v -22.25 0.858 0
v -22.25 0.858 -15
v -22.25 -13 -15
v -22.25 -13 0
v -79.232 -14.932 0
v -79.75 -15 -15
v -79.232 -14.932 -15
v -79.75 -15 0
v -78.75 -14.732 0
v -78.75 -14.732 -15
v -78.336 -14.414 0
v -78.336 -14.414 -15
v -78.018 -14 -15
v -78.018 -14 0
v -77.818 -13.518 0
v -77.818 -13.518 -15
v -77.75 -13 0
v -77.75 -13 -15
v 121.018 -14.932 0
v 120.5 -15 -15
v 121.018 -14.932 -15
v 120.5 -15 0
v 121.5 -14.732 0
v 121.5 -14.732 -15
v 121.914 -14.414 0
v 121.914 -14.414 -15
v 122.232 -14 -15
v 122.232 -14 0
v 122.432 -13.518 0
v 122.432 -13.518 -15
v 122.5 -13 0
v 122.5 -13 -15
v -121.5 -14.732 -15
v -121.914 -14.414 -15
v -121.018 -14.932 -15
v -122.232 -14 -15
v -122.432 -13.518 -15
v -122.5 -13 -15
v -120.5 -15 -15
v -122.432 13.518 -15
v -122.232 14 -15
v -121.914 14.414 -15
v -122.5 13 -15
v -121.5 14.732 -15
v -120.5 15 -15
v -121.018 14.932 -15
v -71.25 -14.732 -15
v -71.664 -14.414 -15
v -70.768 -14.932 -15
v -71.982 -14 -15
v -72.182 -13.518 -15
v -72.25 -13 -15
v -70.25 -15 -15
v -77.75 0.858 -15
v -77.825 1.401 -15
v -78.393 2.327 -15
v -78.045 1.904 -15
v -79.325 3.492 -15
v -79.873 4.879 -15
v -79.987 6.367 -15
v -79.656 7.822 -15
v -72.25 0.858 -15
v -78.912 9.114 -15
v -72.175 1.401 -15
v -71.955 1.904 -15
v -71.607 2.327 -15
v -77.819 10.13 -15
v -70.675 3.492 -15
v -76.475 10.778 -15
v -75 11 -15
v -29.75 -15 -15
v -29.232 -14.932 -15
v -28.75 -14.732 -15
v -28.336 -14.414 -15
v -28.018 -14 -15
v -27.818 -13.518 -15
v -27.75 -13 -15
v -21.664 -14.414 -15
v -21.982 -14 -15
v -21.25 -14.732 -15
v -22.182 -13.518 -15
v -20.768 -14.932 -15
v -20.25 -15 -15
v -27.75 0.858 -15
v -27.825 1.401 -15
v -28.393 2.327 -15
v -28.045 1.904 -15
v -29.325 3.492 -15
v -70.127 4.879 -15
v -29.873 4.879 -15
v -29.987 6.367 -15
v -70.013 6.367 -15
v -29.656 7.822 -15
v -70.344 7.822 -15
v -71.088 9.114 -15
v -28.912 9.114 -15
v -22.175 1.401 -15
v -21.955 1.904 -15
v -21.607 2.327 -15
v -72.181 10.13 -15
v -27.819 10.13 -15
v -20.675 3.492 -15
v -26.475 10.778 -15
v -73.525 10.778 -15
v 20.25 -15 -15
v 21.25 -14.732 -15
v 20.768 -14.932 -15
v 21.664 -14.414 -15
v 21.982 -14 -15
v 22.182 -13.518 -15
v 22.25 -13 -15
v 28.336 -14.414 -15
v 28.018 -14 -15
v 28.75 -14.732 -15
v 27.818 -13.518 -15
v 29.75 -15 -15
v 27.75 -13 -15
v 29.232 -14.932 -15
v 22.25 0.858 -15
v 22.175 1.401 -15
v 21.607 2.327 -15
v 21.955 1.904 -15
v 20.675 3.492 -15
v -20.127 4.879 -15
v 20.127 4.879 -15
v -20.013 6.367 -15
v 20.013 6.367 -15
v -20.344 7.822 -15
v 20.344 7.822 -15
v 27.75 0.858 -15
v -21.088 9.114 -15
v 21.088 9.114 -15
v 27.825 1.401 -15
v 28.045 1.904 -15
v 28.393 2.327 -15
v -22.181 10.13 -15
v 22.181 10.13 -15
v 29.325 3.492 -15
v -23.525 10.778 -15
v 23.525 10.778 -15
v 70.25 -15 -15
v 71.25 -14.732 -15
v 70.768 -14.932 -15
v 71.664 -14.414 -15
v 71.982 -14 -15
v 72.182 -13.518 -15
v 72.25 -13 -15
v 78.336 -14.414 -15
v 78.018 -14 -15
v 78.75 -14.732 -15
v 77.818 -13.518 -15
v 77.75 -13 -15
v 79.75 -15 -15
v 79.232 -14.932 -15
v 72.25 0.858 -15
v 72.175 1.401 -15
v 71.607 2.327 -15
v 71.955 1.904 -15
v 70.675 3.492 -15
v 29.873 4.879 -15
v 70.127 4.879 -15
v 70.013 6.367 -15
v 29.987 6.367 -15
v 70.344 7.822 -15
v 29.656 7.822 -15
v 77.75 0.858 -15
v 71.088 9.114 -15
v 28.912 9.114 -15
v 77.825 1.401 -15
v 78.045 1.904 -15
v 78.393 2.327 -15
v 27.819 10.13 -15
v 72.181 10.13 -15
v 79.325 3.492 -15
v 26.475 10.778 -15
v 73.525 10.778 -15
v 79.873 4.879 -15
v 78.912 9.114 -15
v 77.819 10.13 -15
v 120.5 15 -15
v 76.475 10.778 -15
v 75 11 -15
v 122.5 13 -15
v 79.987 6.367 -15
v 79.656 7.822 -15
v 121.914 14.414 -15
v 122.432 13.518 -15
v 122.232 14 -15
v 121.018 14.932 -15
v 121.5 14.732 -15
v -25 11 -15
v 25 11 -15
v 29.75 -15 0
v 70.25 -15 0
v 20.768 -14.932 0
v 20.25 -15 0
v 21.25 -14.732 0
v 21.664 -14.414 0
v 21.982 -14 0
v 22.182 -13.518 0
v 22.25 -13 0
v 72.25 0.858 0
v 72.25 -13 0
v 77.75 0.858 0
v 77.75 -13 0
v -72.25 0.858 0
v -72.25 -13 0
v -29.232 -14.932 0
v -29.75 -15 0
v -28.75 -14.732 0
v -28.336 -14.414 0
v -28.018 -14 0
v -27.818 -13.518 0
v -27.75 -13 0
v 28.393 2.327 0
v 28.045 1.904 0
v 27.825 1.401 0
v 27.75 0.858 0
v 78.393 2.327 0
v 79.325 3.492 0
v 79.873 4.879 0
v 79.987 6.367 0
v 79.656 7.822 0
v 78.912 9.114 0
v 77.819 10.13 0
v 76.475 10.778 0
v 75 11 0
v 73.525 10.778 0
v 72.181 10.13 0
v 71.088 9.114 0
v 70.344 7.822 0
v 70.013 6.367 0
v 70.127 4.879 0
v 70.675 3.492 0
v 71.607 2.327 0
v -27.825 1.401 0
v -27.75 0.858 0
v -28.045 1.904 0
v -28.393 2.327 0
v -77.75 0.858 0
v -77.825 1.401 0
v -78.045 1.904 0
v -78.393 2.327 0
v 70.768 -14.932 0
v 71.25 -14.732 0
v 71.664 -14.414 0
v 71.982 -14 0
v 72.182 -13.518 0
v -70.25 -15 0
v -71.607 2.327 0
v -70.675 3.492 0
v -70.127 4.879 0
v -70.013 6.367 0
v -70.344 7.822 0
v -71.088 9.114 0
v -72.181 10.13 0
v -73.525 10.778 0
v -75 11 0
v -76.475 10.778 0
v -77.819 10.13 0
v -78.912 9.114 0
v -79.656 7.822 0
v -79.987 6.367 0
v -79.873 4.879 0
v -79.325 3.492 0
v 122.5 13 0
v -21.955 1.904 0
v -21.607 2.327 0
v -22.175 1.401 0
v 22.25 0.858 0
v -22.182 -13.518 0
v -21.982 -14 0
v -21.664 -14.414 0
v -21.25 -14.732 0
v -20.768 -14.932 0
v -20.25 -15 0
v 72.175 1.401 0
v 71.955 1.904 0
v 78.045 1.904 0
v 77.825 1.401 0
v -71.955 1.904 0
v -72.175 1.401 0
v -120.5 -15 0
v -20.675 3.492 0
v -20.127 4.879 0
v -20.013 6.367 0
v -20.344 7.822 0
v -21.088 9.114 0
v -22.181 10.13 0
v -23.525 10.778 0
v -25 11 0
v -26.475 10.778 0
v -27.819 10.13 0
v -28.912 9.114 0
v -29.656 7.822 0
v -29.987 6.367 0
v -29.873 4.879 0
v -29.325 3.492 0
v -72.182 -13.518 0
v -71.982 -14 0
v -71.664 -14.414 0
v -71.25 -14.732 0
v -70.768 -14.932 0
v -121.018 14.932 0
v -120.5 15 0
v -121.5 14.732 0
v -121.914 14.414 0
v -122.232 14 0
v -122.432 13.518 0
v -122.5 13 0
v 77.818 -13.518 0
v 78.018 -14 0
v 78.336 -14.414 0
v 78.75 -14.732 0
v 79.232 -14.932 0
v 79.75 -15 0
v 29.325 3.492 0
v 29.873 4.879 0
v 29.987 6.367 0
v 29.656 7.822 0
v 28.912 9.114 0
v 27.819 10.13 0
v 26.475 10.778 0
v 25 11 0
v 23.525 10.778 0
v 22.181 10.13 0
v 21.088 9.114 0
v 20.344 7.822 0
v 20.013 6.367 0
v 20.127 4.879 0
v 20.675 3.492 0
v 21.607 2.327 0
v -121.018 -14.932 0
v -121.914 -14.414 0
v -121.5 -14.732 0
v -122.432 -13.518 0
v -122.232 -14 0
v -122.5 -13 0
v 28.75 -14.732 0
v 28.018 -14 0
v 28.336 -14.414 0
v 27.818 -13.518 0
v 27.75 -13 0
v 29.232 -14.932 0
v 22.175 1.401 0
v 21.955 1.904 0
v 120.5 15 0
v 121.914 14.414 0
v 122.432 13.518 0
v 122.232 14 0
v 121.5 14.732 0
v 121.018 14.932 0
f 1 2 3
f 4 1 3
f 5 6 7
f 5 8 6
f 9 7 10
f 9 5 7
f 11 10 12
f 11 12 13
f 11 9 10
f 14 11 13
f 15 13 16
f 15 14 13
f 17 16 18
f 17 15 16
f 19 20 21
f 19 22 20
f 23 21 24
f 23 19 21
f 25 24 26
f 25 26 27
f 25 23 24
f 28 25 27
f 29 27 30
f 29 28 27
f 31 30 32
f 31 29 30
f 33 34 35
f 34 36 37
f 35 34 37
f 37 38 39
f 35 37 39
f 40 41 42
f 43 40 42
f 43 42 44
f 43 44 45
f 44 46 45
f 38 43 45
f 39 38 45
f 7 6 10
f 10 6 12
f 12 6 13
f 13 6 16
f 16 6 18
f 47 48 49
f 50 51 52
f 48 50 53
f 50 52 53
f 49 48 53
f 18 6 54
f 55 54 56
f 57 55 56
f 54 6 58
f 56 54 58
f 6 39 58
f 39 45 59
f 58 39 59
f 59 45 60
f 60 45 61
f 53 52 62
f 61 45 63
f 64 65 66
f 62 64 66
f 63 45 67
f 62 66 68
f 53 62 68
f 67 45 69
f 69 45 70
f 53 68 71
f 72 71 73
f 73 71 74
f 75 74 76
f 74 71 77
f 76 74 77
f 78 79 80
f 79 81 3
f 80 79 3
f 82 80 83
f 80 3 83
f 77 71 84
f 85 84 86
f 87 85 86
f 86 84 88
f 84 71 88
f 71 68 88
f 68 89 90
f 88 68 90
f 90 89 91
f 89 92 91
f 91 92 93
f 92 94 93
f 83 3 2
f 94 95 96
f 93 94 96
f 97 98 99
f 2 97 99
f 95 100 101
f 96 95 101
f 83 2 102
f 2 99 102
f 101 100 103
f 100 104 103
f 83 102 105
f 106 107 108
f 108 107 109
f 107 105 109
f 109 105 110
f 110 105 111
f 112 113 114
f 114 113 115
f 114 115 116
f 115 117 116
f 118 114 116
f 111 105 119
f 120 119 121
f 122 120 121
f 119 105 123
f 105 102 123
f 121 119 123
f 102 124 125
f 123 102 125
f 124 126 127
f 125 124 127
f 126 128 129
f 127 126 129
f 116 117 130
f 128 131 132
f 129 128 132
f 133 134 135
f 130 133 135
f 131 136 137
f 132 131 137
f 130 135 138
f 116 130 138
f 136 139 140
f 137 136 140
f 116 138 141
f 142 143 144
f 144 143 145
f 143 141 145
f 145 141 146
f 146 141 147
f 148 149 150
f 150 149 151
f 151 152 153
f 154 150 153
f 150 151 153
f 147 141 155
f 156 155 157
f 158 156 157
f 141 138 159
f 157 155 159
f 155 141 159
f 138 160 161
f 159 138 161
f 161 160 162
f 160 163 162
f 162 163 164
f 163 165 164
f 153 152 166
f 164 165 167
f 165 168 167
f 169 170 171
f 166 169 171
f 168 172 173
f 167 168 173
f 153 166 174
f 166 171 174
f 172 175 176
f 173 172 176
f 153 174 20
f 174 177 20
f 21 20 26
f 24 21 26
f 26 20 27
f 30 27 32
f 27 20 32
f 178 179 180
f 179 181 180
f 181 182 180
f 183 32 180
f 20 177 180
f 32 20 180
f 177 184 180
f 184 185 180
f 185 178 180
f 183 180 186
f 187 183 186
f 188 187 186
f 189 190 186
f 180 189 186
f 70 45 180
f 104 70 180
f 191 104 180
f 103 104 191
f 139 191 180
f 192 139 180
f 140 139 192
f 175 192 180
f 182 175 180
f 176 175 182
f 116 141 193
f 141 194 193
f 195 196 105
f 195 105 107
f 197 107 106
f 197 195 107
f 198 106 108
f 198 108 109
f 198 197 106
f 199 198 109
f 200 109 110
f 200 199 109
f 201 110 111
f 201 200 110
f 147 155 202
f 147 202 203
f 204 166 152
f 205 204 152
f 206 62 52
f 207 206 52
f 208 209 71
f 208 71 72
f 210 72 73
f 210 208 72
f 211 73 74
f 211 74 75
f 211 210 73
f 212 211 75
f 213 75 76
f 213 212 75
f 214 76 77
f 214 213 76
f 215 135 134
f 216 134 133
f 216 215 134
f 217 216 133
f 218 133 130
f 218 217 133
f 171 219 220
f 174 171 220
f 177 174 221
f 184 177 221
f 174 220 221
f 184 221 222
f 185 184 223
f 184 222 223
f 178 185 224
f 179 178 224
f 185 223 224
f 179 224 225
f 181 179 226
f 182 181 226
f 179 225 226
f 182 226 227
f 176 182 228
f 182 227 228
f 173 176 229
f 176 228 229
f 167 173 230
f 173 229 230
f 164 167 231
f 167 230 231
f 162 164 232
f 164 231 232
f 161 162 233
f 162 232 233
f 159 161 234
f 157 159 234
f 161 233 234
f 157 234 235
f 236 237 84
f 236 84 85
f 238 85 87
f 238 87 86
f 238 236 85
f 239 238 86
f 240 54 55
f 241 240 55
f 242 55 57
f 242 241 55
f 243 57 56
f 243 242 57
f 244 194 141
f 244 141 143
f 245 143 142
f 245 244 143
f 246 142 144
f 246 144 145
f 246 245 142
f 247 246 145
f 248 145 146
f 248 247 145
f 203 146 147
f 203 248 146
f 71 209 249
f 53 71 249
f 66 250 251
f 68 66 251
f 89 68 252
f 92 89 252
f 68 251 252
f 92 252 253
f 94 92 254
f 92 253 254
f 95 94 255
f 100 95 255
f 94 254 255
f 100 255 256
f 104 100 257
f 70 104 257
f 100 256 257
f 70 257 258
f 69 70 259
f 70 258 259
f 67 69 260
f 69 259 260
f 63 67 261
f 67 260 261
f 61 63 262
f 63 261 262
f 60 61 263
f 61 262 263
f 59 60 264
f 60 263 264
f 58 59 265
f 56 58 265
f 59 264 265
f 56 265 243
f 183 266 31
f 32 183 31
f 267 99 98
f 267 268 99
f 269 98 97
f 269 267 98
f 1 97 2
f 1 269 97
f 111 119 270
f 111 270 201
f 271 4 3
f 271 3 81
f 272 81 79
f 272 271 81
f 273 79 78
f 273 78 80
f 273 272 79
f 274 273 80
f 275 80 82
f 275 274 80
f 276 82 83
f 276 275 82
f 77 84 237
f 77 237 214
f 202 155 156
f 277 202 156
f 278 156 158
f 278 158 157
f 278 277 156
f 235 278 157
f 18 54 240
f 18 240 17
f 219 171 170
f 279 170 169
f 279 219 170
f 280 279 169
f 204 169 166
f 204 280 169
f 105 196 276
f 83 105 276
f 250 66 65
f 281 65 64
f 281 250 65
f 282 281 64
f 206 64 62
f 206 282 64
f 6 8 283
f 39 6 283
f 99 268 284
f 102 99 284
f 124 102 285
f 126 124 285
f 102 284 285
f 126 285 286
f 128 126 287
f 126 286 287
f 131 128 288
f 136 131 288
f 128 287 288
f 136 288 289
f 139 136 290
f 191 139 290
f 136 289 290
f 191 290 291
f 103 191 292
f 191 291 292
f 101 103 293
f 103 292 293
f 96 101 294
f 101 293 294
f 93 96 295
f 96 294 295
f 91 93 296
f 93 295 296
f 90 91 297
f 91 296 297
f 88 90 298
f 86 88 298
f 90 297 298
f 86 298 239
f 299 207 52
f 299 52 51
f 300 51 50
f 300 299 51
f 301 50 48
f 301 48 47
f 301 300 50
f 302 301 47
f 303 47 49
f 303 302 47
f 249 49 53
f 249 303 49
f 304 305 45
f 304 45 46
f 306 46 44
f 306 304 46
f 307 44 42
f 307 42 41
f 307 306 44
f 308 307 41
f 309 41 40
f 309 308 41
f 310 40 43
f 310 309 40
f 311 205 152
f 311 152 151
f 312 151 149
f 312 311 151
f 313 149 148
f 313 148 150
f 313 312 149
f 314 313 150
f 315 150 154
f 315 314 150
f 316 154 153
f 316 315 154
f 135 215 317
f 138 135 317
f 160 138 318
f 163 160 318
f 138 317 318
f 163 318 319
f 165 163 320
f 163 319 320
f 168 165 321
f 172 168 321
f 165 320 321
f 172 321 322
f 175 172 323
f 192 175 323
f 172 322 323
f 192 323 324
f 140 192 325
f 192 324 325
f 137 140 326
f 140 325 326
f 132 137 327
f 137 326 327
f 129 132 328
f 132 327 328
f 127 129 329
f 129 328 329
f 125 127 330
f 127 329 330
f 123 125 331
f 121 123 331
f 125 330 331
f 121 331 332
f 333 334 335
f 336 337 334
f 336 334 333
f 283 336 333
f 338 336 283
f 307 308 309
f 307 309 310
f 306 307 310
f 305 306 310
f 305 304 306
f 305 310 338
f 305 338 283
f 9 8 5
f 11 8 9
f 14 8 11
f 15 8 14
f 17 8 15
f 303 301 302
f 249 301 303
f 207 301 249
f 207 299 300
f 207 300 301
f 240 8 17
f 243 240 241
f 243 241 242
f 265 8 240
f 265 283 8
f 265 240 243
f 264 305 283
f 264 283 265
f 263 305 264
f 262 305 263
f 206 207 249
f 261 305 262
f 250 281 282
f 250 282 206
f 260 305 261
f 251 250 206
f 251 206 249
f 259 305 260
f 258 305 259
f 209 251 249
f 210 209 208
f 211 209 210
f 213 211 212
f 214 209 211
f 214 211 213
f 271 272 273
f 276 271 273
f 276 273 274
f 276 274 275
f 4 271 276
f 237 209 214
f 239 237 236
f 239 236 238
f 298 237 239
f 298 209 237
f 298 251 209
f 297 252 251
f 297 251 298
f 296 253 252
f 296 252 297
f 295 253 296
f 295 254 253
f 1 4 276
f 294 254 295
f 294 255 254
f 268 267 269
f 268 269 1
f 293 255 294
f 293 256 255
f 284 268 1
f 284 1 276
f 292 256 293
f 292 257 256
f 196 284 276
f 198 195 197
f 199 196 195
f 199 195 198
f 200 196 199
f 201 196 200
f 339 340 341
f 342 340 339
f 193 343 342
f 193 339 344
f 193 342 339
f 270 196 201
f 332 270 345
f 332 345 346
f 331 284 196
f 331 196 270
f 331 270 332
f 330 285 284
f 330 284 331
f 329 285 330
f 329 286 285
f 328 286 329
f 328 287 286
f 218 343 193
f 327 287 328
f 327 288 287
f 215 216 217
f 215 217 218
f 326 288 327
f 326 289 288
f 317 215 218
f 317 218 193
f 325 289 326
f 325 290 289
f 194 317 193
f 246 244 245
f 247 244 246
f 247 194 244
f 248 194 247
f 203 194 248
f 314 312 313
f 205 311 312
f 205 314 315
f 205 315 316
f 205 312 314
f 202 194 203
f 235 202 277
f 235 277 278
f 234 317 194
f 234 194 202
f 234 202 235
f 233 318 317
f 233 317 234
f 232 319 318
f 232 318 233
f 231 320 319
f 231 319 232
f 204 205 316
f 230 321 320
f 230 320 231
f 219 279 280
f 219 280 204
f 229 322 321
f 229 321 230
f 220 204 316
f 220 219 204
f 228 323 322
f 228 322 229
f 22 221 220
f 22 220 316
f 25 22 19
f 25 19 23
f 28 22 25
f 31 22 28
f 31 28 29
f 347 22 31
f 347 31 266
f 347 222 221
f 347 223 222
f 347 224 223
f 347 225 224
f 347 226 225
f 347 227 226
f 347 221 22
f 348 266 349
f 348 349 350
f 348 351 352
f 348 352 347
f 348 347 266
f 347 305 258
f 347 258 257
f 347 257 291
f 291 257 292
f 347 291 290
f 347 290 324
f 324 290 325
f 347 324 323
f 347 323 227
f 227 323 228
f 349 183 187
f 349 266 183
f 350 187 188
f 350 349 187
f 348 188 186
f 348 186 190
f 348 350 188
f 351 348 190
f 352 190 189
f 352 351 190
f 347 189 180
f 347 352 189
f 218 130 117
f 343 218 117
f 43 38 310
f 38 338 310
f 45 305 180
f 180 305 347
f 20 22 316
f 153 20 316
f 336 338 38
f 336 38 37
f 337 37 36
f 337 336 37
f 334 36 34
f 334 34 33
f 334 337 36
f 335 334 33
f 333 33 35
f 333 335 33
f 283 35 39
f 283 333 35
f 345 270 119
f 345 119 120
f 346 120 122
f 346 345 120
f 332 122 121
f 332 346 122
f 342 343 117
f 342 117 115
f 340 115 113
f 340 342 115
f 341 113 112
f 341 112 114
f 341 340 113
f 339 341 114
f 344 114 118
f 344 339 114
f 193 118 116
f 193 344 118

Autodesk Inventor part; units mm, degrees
ref_plane "YZ Plane" through (0, 0, 0) normal (1, 0, 0) x (0, 1, 0)
ref_plane "XZ Plane" through (0, 0, 0) normal (0, 1, 0) x (-1, 0, 0)
ref_plane "XY Plane" through (0, 0, 0) normal (0, 0, 1) x (1, 0, 0)
sketch "Sketch1" plane through (0, 0, 0) normal (0, 0, 1) x (1, 0, 0)
  line L0 (0, 21.5799) -> (0, -21.5799) projected
  line L1 (-172.0799, 0) -> (172.0799, 0) projected
  line L2 (-120.5, 15) -> (120.5, 15)
  line L3 (122.5, 13) -> (122.5, -13)
  line L4 (-122.5, -13) -> (-122.5, 13)
  arc A0 (-21.6071, 2.3273) -> (-28.3929, 2.3273) centre (-25, 6) ccw
  line L5 (-25, 6) -> (-25, -2.9295)
  line L6 (-27.75, 0.8583) -> (-27.75, -13)
  line L7 (-22.25, 0.8583) -> (-22.25, -13)
  arc A1 (-27.75, 0.8583) -> (-28.3929, 2.3273) centre (-29.75, 0.8583) ccw
  arc A2 (-21.6071, 2.3273) -> (-22.25, 0.8583) centre (-20.25, 0.8583) ccw
  arc A3 (-29.75, -15) -> (-27.75, -13) centre (-29.75, -13) ccw
  arc A4 (-22.25, -13) -> (-20.25, -15) centre (-20.25, -13) ccw
  arc A5 (-71.6071, 2.3273) -> (-78.3929, 2.3273) centre (-75, 6) ccw
  line L8 (-75, 6) -> (-75, -2.9295)
  line L9 (-77.75, 0.8583) -> (-77.75, -13)
  line L10 (-72.25, 0.8583) -> (-72.25, -13)
  arc A6 (-77.75, 0.8583) -> (-78.3929, 2.3273) centre (-79.75, 0.8583) ccw
  arc A7 (-71.6071, 2.3273) -> (-72.25, 0.8583) centre (-70.25, 0.8583) ccw
  arc A8 (-79.75, -15) -> (-77.75, -13) centre (-79.75, -13) ccw
  arc A9 (-72.25, -13) -> (-70.25, -15) centre (-70.25, -13) ccw
  line L11 (-29.75, -15) -> (-70.25, -15)
  line L12 (-79.75, -15) -> (-120.5, -15)
  arc A10 (28.3929, 2.3273) -> (21.6071, 2.3273) centre (25, 6) ccw
  line L13 (25, 6) -> (25, -2.9295)
  line L14 (27.75, 0.8583) -> (27.75, -13)
  line L15 (22.25, 0.8583) -> (22.25, -13)
  arc A11 (28.3929, 2.3273) -> (27.75, 0.8583) centre (29.75, 0.8583) ccw
  arc A12 (22.25, 0.8583) -> (21.6071, 2.3273) centre (20.25, 0.8583) ccw
  arc A13 (27.75, -13) -> (29.75, -15) centre (29.75, -13) ccw
  arc A14 (20.25, -15) -> (22.25, -13) centre (20.25, -13) ccw
  line L16 (72.25, 0.8583) -> (72.25, -13)
  arc A15 (72.25, 0.8583) -> (71.6071, 2.3273) centre (70.25, 0.8583) ccw
  arc A16 (70.25, -15) -> (72.25, -13) centre (70.25, -13) ccw
  arc A17 (78.3929, 2.3273) -> (71.6071, 2.3273) centre (75, 6) ccw
  line L17 (77.75, 0.8583) -> (77.75, -13)
  arc A18 (78.3929, 2.3273) -> (77.75, 0.8583) centre (79.75, 0.8583) ccw
  line L18 (75, 6) -> (75, -2.9295)
  arc A19 (77.75, -13) -> (79.75, -15) centre (79.75, -13) ccw
  line L19 (20.25, -15) -> (-20.25, -15)
  line L20 (120.5, -15) -> (79.75, -15)
  line L21 (70.25, -15) -> (29.75, -15)
  arc A20 (-120.5, 15) -> (-122.5, 13) centre (-120.5, 13) ccw
  arc A21 (-122.5, -13) -> (-120.5, -15) centre (-120.5, -13) ccw
  arc A22 (120.5, -15) -> (122.5, -13) centre (120.5, -13) ccw
  arc A23 (122.5, 13) -> (120.5, 15) centre (120.5, 13) ccw
  point P0 (0, 0)
  point P1 (-122.5, 15)
  point P2 (122.5, 15)
  point P3 (-122.5, -15)
  point P4 (-27.75, 1.8242)
  point P5 (-22.25, 1.8242)
  point P6 (-77.75, 1.8242)
  point P7 (-72.25, 1.8242)
  point P8 (27.75, 1.8242)
  point P9 (22.25, 1.8242)
  point P10 (72.25, 1.8242)
  point P11 (77.75, 1.8242)
  dimension "d0" = 245
  dimension "d1" = 30
  dimension "d2" = 10
  dimension "d3" = 25
  dimension "d4" = 6
  dimension "d5" = 5.5
  dimension "d6" = 2
  dimension "d7" = 2
  dimension "d9" = 10
  dimension "d10" = 5.5
  dimension "d11" = 2
  dimension "d12" = 2
  dimension "d13" = 2
  dimension "d14" = 50
extrude "Extrusion1" add sketch "Sketch1" against normal blind 15 contours L2 A23 L3 L1 L17 A18 A17 A15 L16 L14 A11 A10 A12 L15 L0 | L0 L1 L7 A2 A0 A1 L6 L10 A7 A5 A6 L9 L4 A20 L2 | L1 L15 A14 L19 L0 | L0 L19 A4 L7 L1 | L1 L9 A8 L12 A21 L4 | L3 A22 L20 A19 L17 L1 | L6 A3 L11 A9 L10 L1 | L1 L16 A16 L21 A13 L14
properties part number "SlipersLåda 211018007"
